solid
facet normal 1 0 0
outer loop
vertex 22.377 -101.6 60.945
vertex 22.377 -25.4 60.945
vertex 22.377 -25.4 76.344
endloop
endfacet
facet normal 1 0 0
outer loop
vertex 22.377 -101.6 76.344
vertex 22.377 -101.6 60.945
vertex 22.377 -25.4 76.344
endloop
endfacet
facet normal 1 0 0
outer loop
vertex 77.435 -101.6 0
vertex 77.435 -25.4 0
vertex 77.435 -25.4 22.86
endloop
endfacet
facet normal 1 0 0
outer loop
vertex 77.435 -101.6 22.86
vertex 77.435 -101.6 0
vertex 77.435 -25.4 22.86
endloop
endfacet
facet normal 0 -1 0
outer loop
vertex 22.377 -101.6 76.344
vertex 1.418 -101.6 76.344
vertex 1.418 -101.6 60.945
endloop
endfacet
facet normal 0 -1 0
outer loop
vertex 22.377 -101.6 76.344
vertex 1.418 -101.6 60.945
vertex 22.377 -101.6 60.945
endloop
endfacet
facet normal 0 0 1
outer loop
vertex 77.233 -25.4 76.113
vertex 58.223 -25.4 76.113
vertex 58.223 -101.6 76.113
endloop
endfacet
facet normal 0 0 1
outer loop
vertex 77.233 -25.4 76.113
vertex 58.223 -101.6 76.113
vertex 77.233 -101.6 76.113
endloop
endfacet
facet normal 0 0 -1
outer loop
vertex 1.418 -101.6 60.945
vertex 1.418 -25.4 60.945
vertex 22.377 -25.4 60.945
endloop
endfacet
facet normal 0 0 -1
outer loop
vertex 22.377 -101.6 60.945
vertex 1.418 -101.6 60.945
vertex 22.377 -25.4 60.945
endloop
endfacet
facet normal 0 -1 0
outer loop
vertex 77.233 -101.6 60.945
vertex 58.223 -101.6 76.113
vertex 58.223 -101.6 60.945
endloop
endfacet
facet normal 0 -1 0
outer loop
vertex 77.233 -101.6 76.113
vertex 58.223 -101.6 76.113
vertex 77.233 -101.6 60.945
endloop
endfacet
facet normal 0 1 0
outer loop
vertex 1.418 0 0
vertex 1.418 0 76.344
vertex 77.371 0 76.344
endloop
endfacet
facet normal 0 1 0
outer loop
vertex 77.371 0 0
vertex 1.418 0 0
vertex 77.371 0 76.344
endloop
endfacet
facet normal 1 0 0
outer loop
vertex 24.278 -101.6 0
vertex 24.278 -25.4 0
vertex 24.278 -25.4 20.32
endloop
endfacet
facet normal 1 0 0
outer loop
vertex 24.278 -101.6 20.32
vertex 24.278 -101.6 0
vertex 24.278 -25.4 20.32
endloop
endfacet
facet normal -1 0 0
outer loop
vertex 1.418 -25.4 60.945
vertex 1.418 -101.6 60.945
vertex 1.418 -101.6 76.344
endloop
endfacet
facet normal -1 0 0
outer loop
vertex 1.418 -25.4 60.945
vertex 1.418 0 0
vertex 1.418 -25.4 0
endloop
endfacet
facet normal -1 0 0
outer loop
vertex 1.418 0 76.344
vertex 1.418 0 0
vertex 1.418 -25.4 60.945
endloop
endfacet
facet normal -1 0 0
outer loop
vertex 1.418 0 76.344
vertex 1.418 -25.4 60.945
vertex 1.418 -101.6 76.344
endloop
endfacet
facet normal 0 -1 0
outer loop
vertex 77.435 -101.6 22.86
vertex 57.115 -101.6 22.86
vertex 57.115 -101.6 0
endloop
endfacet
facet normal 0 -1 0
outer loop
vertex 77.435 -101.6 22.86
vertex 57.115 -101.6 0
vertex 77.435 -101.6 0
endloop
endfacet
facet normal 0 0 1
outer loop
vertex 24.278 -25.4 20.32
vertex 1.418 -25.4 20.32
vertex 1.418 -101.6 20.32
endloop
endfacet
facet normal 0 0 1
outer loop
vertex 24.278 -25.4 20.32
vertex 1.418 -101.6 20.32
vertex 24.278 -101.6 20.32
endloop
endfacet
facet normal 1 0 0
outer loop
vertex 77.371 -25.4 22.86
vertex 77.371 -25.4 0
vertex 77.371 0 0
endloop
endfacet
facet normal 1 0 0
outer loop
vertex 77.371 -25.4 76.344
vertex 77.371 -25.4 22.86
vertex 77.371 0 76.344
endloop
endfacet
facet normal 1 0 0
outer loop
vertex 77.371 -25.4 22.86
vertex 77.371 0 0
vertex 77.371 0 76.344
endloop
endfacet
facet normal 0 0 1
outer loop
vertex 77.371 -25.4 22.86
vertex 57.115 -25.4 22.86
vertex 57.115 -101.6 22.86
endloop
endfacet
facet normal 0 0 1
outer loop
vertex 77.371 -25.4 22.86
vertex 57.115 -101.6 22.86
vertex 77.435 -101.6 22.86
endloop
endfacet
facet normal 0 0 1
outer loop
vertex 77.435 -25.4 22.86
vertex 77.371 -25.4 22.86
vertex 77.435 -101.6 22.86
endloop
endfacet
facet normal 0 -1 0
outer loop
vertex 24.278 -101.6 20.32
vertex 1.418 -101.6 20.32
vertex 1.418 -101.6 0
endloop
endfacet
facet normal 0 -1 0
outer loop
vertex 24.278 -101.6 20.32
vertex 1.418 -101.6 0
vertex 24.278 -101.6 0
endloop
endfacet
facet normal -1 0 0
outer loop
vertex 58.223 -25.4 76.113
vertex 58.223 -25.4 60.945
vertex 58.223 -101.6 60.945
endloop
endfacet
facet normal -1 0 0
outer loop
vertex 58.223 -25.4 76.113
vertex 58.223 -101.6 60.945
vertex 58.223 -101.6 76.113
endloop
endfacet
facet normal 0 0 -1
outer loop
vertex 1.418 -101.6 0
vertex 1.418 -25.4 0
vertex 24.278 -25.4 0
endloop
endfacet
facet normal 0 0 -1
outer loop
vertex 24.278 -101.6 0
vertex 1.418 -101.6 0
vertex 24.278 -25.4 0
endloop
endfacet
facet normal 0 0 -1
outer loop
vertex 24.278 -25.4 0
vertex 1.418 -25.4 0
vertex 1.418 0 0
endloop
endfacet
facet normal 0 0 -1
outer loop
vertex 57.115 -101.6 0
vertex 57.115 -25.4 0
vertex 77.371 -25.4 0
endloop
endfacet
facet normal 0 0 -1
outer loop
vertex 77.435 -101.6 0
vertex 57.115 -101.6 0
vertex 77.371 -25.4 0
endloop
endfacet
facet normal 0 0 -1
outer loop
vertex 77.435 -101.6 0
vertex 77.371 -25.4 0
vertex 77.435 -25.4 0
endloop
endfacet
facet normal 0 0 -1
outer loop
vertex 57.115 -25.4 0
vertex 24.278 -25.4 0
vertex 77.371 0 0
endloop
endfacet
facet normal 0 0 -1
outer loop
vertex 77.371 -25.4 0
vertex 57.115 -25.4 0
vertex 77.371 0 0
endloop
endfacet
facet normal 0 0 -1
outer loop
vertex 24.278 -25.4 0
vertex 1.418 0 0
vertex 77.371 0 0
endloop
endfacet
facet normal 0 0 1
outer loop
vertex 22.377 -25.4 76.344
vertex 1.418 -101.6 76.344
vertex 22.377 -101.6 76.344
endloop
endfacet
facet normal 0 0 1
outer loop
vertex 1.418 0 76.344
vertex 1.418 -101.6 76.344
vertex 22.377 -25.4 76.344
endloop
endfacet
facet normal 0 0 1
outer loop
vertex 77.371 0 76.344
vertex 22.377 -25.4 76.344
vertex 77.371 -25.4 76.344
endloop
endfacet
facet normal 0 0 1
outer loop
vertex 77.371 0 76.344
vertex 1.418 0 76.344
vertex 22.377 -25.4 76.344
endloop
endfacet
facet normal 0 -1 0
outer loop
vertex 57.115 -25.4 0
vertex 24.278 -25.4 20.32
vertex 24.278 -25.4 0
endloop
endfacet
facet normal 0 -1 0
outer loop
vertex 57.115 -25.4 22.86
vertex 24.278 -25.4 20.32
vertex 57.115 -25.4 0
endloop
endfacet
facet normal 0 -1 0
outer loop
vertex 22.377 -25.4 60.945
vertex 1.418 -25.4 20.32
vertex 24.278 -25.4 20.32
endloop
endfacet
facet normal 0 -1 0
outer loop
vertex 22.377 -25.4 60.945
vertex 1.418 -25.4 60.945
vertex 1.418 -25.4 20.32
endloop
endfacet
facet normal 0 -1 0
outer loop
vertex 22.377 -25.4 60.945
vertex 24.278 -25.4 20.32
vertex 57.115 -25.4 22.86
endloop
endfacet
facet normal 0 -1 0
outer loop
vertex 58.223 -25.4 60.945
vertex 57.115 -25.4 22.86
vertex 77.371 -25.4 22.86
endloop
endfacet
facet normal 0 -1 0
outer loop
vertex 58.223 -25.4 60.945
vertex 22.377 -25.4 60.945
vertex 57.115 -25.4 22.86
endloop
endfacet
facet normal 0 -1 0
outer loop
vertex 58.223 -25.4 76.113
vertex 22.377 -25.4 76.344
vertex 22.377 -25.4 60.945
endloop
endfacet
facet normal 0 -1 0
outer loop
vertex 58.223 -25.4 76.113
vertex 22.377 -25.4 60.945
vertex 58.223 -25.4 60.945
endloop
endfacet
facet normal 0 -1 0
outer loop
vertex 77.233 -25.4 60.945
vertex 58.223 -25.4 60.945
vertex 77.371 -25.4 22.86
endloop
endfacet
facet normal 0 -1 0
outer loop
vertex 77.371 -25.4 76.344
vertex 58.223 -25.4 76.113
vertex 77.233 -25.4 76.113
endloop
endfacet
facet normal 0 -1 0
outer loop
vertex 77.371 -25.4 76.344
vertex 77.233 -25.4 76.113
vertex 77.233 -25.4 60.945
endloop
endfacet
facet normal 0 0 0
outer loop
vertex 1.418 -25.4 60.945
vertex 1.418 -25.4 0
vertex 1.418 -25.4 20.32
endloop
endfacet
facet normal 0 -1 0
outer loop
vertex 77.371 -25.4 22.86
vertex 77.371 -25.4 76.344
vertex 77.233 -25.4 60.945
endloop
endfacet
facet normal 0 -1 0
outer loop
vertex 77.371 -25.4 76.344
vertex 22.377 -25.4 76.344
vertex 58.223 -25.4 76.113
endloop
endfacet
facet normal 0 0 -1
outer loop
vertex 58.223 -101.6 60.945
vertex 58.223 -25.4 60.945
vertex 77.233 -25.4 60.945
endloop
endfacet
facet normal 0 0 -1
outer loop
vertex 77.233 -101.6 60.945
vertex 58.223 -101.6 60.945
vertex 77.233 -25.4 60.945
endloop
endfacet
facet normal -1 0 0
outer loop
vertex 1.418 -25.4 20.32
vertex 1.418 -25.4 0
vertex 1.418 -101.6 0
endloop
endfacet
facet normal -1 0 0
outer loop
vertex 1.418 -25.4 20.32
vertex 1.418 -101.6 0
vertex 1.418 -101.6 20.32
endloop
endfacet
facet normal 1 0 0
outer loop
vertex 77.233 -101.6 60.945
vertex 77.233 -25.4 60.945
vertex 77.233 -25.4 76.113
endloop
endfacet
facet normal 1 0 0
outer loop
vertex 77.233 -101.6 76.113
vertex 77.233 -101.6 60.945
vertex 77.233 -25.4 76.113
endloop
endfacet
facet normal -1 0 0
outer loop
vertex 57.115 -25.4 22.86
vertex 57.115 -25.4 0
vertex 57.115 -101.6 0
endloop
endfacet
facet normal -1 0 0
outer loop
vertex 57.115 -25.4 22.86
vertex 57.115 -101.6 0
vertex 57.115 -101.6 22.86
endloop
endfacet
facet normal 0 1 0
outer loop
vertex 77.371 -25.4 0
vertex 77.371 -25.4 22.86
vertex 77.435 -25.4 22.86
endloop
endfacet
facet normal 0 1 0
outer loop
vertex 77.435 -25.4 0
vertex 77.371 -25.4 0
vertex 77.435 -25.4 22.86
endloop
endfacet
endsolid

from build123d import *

# Parameters (mm, degrees)
F0_W     = 75.953597
F0_H     = 76.343752
F1_DEPTH = 25.4
F2_W     = 22.86
F2_H     = 20.32
F2_W_2   = 20.958833
F2_H_2   = 15.39883
F3_DEPTH = 76.2
F5_W     = 20.32
F5_H     = 22.86
F5_W_2   = 19.010187
F5_H_2   = 15.167706
F6_DEPTH = 76.2


with BuildPart() as f1:
    # F0 (on Front) → F1 (new body)
    with BuildSketch(Plane.XZ):
        with Locations((39.394597, 38.171876)):
            Rectangle(F0_W, F0_H)
    extrude(amount=F1_DEPTH)

    # F2 (on face) → F3 (join)
    with BuildSketch(Plane.XZ.offset(25.4)):
        with Locations((12.847799, 10.16)):
            Rectangle(F2_W, F2_H)
        with Locations((11.897215, 68.644337)):
            Rectangle(F2_W_2, F2_H_2)
    extrude(amount=F3_DEPTH)

    # F5 (on face) → F6 (join)
    with BuildSketch(Plane.XZ.offset(25.4)):
        with Locations((67.275393, 11.43)):
            Rectangle(F5_W, F5_H)
        with Locations((67.728057, 68.528775)):
            Rectangle(F5_W_2, F5_H_2)
    extrude(amount=F6_DEPTH)


solid = f1.part
